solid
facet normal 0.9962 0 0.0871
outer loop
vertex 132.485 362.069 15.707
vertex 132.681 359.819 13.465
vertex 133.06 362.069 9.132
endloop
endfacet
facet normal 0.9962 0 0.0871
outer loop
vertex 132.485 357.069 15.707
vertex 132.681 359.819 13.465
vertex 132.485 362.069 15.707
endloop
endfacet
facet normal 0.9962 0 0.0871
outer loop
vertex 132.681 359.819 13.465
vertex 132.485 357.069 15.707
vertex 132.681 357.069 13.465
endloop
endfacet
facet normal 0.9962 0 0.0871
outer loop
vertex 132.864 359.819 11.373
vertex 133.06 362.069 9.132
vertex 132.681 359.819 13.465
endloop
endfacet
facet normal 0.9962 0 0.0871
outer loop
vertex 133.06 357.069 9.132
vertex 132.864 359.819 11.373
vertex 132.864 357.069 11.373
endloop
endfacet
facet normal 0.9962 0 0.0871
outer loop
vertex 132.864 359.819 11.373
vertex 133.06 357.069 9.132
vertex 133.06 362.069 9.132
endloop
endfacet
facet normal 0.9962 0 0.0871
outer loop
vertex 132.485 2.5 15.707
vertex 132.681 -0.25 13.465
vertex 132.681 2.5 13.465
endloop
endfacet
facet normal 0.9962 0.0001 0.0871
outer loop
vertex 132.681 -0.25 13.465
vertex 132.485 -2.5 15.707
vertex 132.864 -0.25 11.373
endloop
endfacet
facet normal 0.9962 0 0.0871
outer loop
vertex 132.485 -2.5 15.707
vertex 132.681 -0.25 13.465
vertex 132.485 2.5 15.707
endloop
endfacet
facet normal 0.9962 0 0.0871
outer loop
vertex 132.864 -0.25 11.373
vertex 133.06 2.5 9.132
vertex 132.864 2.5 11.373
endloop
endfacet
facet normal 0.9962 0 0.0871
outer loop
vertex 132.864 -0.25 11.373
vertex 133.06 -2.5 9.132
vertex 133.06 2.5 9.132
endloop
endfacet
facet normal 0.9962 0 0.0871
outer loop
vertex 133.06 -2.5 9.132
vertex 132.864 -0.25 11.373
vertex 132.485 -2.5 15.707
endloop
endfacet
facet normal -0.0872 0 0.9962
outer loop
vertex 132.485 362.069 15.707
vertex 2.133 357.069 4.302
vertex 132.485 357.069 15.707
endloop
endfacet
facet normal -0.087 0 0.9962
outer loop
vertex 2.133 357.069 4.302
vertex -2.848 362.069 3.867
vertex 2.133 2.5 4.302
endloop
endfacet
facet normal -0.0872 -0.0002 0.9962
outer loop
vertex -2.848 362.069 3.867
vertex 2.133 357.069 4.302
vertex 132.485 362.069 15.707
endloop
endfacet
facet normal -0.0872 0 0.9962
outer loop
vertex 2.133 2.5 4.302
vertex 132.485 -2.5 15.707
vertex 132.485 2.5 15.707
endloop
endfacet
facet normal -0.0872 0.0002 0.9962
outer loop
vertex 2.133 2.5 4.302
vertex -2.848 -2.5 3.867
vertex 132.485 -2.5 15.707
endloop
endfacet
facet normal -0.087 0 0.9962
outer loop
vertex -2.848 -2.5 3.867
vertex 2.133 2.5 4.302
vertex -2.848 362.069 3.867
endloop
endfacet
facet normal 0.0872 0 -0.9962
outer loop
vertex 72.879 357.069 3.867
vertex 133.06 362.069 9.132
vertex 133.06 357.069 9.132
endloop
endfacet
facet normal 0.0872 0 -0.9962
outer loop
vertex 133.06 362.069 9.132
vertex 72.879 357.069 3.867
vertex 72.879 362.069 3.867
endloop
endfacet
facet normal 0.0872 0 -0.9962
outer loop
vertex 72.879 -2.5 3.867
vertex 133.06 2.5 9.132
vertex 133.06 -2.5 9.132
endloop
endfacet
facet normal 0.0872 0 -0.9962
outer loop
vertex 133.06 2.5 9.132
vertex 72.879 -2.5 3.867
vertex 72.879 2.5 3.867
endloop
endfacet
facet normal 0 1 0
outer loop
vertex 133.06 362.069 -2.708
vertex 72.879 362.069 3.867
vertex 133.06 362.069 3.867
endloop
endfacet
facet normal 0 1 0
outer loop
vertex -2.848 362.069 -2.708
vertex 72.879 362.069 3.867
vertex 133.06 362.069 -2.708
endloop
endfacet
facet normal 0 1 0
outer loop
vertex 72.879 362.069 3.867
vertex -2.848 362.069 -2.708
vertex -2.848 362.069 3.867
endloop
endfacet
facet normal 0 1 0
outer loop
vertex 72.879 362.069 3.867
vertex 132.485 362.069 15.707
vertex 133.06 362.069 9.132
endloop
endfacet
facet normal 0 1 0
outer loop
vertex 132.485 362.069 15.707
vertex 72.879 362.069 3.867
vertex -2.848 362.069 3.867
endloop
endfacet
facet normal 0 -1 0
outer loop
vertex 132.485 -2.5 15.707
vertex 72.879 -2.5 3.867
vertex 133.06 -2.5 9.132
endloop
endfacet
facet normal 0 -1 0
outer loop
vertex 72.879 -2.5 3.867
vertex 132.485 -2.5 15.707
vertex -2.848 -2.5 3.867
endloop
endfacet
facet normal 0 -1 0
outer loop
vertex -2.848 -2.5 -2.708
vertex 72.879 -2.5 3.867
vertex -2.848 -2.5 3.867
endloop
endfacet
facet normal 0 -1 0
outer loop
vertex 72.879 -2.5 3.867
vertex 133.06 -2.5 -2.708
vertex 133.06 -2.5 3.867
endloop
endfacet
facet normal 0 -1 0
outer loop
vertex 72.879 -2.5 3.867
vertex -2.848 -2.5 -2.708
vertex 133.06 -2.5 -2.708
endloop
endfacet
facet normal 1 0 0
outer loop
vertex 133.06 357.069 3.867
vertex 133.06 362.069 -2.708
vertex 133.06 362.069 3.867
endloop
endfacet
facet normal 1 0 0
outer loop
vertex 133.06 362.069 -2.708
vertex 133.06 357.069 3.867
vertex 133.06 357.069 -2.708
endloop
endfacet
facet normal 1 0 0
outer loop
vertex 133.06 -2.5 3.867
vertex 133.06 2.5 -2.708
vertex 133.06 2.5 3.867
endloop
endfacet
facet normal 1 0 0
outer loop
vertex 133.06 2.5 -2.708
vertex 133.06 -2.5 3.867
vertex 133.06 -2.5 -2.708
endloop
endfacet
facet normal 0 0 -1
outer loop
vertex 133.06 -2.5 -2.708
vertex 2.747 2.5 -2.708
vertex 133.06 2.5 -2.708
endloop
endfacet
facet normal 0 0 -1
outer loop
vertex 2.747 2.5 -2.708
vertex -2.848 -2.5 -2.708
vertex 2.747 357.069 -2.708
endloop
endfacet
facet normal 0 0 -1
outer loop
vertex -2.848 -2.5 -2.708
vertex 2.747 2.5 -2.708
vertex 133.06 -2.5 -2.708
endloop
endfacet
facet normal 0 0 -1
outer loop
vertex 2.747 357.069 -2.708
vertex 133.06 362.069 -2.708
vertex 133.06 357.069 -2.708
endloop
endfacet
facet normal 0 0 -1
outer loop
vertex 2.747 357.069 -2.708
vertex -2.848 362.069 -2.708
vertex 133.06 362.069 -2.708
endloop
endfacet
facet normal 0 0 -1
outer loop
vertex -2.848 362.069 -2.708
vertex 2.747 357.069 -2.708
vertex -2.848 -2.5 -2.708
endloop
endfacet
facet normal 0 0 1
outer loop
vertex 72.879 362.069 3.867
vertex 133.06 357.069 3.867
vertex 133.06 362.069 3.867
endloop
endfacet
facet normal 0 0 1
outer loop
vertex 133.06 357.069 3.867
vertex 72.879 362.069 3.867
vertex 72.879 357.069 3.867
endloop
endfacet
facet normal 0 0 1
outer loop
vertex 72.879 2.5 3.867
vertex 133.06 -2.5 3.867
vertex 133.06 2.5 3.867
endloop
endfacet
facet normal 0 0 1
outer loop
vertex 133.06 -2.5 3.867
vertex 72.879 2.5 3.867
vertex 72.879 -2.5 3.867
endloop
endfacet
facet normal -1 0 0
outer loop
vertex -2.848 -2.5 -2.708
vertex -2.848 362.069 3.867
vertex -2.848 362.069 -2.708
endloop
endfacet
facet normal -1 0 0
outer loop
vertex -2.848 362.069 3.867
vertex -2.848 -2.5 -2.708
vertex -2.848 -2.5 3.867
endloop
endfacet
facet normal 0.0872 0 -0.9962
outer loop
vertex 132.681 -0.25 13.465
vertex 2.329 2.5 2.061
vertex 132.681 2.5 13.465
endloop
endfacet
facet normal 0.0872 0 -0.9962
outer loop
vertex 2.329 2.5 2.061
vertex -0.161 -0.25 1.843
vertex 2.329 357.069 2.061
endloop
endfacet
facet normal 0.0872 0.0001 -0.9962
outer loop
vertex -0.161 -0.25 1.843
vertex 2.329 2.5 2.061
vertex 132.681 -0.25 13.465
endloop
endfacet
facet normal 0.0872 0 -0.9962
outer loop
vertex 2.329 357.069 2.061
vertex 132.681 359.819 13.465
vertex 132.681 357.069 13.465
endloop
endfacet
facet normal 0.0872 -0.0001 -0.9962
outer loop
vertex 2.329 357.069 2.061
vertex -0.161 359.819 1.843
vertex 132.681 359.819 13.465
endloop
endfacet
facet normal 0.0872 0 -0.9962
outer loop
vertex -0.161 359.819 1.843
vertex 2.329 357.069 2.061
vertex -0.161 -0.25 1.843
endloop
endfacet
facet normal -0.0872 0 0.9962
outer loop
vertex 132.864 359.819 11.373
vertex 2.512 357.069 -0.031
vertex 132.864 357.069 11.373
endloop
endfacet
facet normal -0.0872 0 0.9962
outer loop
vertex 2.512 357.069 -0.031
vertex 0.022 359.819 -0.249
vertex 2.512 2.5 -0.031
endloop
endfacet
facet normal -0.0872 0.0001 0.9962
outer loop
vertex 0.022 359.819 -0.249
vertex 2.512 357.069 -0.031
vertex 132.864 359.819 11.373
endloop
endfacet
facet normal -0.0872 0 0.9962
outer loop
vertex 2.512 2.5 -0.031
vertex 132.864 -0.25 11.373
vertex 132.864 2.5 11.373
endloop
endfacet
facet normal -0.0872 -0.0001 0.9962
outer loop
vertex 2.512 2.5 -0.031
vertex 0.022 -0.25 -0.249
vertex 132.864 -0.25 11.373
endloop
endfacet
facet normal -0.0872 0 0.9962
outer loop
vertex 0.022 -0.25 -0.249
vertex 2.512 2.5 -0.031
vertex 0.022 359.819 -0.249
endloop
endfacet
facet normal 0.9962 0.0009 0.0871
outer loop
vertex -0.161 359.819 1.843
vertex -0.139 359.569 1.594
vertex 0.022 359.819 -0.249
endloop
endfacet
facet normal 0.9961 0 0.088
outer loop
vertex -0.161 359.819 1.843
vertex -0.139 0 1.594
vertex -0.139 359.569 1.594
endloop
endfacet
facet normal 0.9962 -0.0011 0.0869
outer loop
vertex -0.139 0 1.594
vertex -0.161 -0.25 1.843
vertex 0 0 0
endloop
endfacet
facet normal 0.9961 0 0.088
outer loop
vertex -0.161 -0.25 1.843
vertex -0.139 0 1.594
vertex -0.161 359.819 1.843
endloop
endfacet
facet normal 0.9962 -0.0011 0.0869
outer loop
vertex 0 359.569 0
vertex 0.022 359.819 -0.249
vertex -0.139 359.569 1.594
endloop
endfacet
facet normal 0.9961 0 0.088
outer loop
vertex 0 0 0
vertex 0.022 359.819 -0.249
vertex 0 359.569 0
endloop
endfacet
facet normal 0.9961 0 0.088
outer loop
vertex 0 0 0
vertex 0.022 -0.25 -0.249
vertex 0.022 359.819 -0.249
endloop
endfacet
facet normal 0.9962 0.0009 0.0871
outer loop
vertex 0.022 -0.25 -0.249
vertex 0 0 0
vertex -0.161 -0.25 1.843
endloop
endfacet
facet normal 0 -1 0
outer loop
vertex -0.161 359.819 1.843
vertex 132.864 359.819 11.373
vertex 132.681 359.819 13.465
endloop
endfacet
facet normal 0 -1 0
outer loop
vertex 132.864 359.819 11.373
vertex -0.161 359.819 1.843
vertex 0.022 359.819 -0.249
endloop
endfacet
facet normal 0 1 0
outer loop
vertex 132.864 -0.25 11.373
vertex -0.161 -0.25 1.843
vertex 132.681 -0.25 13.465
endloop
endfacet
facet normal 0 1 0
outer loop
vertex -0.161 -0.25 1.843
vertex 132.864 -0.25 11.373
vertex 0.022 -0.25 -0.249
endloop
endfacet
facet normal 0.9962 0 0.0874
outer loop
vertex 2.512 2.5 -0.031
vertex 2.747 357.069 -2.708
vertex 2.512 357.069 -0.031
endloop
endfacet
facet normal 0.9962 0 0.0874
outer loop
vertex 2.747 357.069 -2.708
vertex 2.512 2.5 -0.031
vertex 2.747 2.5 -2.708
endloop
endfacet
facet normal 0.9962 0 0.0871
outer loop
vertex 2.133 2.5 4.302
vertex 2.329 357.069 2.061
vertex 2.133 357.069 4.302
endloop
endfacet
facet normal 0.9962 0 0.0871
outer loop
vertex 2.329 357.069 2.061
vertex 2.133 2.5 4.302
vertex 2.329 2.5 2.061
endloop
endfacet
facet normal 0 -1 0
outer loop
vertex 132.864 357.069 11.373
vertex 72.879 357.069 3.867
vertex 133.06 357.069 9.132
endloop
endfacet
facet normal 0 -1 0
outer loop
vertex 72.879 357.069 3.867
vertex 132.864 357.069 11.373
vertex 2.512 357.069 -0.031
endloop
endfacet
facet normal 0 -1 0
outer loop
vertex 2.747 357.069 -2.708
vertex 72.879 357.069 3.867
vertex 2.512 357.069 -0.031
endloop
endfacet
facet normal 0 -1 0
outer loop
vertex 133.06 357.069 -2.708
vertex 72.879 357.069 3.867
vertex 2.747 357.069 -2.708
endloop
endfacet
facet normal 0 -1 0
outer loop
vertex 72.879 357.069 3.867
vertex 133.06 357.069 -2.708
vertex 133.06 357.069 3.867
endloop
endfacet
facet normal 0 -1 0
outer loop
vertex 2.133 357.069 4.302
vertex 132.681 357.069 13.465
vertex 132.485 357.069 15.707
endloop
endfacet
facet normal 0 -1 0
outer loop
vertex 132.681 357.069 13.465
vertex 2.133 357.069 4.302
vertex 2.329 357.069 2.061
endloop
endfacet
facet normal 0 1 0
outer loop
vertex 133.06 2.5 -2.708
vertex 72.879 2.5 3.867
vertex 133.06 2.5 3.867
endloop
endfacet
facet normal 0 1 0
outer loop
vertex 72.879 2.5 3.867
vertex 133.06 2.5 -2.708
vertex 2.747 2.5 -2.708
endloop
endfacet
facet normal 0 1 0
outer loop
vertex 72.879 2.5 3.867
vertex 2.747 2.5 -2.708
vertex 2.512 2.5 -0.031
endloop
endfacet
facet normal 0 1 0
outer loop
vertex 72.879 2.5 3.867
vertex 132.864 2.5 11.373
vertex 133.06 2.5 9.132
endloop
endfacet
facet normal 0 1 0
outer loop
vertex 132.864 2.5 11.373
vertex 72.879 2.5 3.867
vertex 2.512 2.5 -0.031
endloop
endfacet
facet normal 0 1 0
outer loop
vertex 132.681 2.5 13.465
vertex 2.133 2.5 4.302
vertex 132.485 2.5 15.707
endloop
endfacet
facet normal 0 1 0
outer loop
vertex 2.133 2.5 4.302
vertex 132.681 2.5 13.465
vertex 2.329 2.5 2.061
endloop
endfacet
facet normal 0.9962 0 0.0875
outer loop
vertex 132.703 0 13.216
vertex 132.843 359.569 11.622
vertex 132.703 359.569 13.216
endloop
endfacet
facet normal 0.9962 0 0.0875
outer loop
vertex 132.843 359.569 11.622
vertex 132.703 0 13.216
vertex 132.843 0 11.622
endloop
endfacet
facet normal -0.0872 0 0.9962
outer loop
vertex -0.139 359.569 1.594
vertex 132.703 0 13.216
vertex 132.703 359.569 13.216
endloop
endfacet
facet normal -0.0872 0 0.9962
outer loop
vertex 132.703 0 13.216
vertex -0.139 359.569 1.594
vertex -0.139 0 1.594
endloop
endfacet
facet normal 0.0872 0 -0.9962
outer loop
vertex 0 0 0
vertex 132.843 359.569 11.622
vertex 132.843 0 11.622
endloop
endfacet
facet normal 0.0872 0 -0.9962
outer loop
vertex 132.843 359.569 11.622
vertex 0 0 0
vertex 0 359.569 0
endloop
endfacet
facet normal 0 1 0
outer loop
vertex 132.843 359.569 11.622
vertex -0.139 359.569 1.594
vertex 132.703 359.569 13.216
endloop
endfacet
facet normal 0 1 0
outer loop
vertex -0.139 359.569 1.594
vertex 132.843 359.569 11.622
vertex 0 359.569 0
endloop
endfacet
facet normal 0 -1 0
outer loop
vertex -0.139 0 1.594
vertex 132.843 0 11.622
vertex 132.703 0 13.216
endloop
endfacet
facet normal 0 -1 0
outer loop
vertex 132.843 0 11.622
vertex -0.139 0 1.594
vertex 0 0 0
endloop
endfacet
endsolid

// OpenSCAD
pcb_size = [133.35,359.56875,1.6];
tolerance = 0.5;
case_thickness = 5;
angle = 5;


module pcb(){
    
    cube(pcb_size);
}

module case(){
    difference() {
        union() {
            cube(
                pcb_size +
                [
                    case_thickness/2,
                    case_thickness,
                    case_thickness
                ]
            );

            case_feet();
        }
        
        translate([case_thickness/2,
                case_thickness/2-tolerance/2,
                case_thickness/2-tolerance/2]) 
        cube(pcb_size+[0,tolerance,tolerance]);

        translate([case_thickness,
                case_thickness,
                -500]) 
        cube(pcb_size-[case_thickness/2,case_thickness,0]+ [0,0,10000]);
    }

}

module case_feet() {
  /*
        /
       |\    /     /
       | \  /     /
       \  \/     /___
   |    \ |      
  a|     \|___________
          
          |--b-- ... ---|

  */

    top_piece_d = pcb_size.x  + case_thickness/2;

    top_piece_h = pcb_size.z + case_thickness;
    top_piece_w = pcb_size.y + case_thickness;

    a = cos(angle) * top_piece_h;
    b = cos(angle) * top_piece_d + sin(angle) * top_piece_h;
    
    difference() {
        translate([0,0,top_piece_h]) 
        rotate([0,90+angle,0]) 
        cube([a,top_piece_w,b]);
    }

}






rotate([0,-angle,0]){
    color(c = "green") 
   pcb();

translate([-case_thickness/2,-case_thickness/2,-case_thickness/2]) 
case();

}
